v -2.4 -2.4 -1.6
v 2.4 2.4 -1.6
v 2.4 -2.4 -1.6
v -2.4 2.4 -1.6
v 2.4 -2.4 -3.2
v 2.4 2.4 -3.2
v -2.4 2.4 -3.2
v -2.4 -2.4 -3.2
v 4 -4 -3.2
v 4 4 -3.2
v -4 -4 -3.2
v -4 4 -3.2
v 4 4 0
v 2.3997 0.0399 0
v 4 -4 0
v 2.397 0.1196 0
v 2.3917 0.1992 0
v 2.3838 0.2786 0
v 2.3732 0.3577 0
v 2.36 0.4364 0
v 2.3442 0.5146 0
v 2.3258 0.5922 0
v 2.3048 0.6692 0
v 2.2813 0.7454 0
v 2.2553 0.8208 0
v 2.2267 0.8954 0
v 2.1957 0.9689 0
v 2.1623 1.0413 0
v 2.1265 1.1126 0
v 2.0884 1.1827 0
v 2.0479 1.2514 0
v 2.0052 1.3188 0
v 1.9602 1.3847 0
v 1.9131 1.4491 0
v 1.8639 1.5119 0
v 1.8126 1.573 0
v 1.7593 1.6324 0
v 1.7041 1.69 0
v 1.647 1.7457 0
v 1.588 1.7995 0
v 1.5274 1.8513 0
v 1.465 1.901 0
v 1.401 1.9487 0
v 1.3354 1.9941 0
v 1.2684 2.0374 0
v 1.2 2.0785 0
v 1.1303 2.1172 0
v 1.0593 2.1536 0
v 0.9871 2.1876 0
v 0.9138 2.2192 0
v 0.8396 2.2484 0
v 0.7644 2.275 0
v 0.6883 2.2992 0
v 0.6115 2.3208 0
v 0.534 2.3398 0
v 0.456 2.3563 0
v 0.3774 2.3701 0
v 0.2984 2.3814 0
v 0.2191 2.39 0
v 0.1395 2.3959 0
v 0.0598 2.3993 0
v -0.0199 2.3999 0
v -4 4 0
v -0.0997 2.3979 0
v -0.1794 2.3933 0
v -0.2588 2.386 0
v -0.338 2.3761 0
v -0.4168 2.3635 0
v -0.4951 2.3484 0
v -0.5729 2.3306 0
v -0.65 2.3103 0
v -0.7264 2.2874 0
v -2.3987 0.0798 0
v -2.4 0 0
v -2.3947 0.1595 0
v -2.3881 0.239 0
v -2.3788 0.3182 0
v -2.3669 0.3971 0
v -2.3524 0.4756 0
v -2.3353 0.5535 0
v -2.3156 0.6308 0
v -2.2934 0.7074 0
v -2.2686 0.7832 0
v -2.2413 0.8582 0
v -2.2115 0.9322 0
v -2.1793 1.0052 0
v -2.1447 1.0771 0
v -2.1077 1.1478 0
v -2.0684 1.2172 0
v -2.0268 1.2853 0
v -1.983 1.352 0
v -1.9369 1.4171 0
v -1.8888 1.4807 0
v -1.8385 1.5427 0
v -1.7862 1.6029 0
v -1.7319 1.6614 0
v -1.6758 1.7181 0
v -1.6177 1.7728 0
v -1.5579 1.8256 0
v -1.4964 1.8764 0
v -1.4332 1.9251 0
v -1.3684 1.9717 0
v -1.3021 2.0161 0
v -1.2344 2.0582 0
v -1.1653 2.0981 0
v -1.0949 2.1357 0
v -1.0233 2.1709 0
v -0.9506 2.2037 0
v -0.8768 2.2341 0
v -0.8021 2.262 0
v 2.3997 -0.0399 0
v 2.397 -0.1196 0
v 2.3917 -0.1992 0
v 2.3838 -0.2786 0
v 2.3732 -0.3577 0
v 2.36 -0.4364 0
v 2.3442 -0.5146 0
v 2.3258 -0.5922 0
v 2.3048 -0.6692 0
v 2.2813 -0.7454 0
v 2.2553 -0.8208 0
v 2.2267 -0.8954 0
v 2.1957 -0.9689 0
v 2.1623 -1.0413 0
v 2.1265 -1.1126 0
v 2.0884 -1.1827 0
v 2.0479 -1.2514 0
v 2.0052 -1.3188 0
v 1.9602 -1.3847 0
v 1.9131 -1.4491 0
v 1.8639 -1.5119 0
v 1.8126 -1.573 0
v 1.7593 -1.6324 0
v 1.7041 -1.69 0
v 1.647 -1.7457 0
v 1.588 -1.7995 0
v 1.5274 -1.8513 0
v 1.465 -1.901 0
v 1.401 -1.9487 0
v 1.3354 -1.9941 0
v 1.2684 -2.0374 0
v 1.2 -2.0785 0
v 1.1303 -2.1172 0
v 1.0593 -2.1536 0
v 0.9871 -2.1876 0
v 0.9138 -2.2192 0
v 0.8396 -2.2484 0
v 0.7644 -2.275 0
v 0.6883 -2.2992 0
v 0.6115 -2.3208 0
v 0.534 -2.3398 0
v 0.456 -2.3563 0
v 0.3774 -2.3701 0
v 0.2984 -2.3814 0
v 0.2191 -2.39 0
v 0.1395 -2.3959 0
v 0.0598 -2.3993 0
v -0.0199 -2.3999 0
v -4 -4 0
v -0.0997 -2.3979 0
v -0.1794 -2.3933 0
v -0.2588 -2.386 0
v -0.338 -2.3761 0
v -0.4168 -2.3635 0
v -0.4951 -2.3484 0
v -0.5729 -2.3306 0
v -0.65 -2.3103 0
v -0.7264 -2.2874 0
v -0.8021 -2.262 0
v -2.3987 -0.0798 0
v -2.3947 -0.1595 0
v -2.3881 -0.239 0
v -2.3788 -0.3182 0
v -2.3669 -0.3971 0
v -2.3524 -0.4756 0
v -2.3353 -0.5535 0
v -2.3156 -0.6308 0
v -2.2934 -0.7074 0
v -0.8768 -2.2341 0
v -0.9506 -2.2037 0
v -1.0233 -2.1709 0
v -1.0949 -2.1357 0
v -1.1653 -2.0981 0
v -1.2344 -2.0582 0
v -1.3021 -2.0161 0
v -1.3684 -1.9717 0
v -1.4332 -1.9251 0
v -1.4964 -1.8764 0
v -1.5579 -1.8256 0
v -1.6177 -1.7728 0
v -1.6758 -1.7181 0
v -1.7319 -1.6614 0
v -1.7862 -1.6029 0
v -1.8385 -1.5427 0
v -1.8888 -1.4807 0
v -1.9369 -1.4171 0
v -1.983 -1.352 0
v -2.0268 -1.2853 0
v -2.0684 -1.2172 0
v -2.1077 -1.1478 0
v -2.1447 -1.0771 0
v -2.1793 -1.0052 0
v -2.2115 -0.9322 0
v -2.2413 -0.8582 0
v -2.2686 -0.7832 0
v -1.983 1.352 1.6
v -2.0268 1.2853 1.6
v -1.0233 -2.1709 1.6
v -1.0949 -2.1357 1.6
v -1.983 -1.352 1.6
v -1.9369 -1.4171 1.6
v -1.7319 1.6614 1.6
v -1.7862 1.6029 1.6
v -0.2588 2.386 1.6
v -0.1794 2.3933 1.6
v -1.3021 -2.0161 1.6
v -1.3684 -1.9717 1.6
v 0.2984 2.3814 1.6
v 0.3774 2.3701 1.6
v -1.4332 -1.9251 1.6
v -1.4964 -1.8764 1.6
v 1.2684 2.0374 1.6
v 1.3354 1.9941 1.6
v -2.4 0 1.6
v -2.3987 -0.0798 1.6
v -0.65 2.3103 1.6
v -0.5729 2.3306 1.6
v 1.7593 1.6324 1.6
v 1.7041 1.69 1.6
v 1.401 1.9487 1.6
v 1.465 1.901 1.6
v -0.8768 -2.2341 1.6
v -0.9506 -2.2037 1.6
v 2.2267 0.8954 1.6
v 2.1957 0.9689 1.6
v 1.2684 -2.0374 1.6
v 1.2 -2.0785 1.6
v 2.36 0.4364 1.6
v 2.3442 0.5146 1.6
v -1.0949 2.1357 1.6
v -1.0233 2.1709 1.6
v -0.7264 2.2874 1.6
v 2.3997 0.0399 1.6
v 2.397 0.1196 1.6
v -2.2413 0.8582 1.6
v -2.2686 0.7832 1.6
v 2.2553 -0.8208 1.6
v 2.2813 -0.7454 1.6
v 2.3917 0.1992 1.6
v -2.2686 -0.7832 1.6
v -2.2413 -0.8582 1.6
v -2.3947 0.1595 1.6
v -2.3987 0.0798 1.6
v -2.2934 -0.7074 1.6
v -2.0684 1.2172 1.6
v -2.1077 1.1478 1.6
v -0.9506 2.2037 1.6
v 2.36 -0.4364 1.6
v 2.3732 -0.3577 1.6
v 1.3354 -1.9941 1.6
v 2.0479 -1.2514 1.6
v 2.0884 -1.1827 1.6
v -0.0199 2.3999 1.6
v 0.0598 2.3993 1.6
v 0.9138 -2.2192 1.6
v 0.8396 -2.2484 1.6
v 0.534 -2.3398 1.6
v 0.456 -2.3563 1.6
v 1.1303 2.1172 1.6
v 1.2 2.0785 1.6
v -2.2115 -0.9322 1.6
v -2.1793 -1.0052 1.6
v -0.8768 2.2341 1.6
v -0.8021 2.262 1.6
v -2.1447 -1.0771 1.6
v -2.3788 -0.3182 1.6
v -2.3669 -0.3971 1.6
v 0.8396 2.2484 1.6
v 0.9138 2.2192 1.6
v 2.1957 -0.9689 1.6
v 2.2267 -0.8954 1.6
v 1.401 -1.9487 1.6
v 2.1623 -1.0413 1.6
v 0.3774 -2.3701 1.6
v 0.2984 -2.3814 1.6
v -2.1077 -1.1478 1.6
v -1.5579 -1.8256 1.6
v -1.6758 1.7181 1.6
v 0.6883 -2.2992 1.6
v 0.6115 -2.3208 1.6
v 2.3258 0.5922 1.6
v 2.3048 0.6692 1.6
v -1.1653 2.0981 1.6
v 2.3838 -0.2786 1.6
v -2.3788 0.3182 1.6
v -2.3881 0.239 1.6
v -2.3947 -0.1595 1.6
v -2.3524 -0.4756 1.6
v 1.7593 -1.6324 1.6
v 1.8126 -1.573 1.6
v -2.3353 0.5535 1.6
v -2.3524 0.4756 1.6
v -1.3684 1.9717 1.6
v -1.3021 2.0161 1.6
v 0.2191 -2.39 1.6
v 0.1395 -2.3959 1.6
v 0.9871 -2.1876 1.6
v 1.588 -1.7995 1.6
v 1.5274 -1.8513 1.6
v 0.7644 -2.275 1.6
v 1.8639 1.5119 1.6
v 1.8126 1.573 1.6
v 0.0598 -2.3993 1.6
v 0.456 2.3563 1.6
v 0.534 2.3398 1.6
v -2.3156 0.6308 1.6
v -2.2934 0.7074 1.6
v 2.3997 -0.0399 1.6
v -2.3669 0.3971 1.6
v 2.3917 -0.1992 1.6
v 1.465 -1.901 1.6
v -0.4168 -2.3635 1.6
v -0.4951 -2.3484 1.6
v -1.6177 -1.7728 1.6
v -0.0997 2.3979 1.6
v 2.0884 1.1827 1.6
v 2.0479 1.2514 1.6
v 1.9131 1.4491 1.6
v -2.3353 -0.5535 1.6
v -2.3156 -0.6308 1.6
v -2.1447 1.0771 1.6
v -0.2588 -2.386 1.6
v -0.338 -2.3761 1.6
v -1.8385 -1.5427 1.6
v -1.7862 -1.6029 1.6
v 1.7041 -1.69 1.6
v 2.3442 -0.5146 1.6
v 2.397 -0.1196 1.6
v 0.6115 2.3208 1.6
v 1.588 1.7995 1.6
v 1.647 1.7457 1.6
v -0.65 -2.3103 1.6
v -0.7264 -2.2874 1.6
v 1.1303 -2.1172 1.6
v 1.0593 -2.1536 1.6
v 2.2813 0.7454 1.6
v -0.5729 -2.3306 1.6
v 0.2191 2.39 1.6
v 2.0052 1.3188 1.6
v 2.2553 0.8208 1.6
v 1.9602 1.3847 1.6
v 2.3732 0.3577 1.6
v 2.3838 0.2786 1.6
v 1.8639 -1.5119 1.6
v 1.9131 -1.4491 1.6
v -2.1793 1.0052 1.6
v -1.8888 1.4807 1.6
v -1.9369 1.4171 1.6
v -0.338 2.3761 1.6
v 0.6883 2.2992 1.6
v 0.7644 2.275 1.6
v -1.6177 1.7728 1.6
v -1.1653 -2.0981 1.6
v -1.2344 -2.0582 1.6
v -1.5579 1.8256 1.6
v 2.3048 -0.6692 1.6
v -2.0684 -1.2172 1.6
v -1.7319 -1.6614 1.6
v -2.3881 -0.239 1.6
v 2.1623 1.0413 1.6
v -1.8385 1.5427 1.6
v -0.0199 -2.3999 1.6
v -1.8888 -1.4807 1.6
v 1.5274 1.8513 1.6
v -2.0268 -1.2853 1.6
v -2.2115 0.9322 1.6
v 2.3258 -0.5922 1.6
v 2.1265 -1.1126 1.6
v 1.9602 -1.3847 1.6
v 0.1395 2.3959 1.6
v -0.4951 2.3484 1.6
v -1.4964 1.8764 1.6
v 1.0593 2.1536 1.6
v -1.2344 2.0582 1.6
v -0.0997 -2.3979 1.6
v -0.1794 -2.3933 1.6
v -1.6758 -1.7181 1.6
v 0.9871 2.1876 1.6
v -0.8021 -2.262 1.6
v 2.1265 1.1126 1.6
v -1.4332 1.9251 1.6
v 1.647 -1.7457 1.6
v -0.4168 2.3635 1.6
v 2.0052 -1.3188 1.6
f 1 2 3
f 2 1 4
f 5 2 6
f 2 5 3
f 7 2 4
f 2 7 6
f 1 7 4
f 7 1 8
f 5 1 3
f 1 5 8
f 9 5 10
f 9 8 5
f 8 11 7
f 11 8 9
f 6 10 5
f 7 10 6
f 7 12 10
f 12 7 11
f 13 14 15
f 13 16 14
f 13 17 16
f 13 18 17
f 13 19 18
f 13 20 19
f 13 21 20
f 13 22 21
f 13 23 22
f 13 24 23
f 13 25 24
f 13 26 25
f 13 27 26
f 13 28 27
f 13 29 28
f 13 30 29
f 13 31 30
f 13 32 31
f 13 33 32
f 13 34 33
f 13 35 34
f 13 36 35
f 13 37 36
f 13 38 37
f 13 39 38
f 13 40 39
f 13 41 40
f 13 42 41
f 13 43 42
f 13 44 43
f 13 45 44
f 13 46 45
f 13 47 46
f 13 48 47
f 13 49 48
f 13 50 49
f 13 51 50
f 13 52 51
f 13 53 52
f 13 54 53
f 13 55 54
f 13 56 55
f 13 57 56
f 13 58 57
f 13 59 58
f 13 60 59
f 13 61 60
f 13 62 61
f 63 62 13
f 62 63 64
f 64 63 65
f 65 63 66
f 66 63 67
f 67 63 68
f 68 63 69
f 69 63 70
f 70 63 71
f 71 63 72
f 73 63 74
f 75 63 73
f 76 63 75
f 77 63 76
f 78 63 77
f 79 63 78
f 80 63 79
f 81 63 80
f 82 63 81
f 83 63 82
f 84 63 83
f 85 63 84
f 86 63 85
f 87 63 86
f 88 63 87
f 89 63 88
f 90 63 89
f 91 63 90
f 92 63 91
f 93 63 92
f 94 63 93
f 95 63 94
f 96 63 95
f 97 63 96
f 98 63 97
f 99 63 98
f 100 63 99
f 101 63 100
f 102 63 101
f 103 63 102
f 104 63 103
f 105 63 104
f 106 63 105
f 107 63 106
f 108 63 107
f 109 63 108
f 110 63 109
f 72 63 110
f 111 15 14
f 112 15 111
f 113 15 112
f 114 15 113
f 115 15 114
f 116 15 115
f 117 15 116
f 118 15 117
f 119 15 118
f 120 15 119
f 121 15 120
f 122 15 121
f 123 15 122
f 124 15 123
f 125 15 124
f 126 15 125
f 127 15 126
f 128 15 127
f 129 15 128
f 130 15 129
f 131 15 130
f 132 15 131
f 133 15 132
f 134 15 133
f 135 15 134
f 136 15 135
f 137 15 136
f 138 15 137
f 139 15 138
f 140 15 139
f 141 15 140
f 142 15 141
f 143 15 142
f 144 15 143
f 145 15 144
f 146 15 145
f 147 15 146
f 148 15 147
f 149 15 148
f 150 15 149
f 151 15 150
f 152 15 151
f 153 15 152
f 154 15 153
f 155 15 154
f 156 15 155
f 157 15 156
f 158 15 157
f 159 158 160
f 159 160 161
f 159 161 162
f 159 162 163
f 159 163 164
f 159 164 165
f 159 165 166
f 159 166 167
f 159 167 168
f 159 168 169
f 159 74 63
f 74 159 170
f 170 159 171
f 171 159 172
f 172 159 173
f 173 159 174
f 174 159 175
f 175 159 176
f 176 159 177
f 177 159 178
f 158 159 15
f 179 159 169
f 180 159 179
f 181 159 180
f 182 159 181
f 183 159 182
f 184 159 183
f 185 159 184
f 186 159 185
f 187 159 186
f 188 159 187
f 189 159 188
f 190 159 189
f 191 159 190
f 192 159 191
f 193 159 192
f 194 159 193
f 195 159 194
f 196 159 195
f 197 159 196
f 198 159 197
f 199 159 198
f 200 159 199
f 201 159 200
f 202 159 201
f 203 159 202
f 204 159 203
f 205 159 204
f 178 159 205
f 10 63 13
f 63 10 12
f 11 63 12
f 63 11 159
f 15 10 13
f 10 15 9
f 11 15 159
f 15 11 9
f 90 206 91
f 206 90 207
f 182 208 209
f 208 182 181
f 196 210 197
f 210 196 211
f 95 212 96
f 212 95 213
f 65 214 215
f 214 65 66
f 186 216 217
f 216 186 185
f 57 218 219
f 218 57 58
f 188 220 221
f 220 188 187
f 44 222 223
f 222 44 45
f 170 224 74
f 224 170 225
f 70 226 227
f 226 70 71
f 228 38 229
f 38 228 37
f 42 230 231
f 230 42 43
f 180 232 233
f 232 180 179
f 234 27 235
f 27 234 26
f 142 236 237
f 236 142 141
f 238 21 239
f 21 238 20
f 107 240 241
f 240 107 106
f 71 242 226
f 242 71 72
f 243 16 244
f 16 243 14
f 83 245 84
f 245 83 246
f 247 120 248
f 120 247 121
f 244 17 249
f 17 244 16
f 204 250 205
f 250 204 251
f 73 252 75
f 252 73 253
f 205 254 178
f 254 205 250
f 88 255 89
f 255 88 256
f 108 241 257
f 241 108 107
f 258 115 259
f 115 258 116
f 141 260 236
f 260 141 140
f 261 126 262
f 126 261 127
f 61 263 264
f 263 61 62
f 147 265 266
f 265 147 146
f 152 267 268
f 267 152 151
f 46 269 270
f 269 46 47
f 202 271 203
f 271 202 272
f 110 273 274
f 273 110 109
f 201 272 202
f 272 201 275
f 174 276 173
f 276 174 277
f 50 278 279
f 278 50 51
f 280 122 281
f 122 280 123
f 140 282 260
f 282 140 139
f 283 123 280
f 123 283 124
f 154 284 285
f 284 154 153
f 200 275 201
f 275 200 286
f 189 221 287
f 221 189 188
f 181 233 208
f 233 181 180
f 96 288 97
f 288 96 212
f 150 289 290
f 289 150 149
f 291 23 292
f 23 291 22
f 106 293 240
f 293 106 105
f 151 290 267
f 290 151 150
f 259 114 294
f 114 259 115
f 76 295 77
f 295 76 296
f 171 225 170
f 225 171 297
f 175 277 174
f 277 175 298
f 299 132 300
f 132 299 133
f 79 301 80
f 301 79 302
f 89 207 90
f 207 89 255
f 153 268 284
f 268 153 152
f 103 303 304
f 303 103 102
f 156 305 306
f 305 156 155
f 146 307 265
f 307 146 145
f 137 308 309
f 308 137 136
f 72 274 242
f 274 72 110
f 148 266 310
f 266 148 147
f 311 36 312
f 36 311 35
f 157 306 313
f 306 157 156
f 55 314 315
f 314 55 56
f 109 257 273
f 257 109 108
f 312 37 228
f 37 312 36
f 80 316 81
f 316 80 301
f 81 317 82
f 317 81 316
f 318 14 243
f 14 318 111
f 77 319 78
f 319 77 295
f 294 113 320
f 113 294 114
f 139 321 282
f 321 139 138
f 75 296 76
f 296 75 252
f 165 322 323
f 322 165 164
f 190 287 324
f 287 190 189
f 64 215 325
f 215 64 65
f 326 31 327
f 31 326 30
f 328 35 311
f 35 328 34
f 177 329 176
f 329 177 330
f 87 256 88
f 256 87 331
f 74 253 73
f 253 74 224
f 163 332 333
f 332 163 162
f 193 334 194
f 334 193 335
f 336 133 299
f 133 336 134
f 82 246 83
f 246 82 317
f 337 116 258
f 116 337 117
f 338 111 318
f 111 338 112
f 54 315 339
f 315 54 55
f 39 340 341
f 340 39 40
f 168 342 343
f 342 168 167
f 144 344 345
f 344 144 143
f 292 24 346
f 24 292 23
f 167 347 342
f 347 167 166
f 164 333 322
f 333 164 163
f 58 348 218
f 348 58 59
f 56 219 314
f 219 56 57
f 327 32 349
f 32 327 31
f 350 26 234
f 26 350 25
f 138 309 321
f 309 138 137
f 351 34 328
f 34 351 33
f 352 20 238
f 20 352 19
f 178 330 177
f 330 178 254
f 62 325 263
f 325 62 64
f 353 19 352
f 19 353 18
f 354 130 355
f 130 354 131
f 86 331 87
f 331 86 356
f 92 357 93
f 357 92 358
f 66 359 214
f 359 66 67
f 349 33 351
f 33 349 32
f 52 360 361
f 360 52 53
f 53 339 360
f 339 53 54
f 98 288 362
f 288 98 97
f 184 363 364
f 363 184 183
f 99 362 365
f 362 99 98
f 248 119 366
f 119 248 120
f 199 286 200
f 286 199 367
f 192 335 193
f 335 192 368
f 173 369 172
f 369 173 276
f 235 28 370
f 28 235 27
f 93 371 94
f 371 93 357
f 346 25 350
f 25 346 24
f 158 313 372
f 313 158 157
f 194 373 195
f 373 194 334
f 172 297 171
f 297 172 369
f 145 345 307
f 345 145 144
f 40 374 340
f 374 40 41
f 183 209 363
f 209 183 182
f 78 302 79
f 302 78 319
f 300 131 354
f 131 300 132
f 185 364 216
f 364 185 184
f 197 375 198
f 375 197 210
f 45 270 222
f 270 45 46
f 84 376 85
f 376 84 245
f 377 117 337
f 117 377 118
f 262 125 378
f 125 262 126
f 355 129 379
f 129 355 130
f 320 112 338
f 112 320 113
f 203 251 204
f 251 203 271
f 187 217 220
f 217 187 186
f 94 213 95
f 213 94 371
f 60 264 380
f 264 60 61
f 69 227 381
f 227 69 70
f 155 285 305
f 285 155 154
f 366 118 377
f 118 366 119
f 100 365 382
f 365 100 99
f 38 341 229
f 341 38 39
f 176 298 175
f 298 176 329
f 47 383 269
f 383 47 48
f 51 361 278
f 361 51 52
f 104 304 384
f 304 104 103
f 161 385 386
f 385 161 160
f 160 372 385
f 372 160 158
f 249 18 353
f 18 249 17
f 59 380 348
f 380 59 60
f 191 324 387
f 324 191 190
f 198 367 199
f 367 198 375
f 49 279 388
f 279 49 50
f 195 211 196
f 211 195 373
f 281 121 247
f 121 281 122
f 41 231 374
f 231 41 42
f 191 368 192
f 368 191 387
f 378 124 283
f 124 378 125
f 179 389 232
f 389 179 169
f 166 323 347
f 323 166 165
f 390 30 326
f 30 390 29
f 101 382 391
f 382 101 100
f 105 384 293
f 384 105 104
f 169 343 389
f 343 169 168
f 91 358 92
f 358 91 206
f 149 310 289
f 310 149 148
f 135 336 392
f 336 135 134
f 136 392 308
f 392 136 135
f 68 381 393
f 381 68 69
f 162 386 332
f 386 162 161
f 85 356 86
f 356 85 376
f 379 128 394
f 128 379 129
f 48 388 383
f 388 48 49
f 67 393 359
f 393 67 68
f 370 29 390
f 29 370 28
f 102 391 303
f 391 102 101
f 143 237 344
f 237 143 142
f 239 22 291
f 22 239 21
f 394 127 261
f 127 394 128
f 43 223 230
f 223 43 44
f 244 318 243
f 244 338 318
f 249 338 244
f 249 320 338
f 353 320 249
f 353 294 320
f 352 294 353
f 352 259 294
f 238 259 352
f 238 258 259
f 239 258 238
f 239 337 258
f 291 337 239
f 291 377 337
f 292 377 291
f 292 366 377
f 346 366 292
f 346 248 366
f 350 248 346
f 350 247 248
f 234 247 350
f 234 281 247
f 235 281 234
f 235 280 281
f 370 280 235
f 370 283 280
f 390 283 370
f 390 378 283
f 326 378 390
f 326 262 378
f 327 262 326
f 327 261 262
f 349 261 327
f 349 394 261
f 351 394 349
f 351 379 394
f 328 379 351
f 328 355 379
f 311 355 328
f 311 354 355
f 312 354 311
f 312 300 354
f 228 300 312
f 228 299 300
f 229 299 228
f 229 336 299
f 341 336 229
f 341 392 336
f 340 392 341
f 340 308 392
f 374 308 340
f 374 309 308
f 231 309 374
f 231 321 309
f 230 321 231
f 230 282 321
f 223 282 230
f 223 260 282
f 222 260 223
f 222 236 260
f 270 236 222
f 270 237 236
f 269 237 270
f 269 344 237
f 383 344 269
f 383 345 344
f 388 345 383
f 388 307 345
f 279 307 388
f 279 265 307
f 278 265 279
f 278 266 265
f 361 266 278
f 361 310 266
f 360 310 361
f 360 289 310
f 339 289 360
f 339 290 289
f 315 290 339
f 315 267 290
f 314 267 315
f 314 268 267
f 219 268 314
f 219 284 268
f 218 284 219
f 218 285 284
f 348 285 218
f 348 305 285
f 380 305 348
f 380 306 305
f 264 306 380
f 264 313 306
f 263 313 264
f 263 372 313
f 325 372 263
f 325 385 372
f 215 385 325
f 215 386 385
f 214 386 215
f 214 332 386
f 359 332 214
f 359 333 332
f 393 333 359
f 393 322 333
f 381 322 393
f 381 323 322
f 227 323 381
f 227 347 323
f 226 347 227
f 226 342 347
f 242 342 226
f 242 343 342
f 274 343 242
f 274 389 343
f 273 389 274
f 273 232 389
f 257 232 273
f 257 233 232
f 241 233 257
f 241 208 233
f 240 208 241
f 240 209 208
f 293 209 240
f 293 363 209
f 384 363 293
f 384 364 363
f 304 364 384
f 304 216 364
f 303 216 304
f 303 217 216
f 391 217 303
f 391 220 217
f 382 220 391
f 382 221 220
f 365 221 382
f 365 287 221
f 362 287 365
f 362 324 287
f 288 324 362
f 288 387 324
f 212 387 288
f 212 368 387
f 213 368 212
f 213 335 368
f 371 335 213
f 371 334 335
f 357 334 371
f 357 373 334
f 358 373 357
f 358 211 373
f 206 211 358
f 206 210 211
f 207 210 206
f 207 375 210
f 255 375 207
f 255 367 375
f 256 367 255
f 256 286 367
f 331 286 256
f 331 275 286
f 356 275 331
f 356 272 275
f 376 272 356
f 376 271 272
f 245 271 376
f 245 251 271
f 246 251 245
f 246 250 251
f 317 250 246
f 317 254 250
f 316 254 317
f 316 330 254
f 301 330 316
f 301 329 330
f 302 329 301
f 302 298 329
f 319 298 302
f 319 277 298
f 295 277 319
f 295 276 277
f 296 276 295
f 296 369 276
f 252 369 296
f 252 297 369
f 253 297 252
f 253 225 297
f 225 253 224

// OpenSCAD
// file: ../p/stud3.scad
use <../lib.scad>
use <4-4cyli.scad>
use <4-4disc.scad>
use <4-4edge.scad>
$fa=1; $fs=0.2;
function ldraw_lib__stud3(realsolid=false) = realsolid ? 
    [openscad(translate([0,0,-eps()], o=cylinder(4+eps(), r=4)),2)] : [
// 0 Stud Tube Solid
// 0 Name: stud3.dat
// 0 Author: James Jessiman
// 0 !LDRAW_ORG Primitive UPDATE 2012-01
// 0 !LICENSE Licensed under CC BY 2.0 and CC BY 4.0 : see CAreadme.txt
// 
// 0 BFC CERTIFY CCW
  [0,"BFC","CERTIFY"],
  [0,"BFC","CCW"],
// 
// 0 !HISTORY 2002-04-04 [sbliss] Modified for BFC compliance
// 0 !HISTORY 2002-04-25 [PTadmin] Official Update 2002-02
// 0 !HISTORY 2007-06-24 [PTadmin] Header formatted for Contributor Agreement
// 0 !HISTORY 2008-07-01 [PTadmin] Official Update 2008-01
// 0 !HISTORY 2012-02-16 [Philo] Changed to CCW
// 0 !HISTORY 2012-03-30 [PTadmin] Official Update 2012-01
// 
// 
// 1 16 0 -4 0 4 0 0 0 1 0 0 0 4 4-4edge.dat
  [1,16,0,-4,0,4,0,0,0,1,0,0,0,4, ldraw_lib__4_4edge(realsolid)],
// 1 16 0 0 0 4 0 0 0 1 0 0 0 4 4-4edge.dat
  [1,16,0,0,0,4,0,0,0,1,0,0,0,4, ldraw_lib__4_4edge(realsolid)],
// 1 16 0 -4 0 4 0 0 0 1 0 0 0 4 4-4disc.dat
  [1,16,0,-4,0,4,0,0,0,1,0,0,0,4, ldraw_lib__4_4disc(realsolid)],
// 1 16 0 -4 0 4 0 0 0 4 0 0 0 4 4-4cyli.dat
  [1,16,0,-4,0,4,0,0,0,4,0,0,0,4, ldraw_lib__4_4cyli(realsolid)],
];
module ldraw_lib__stud3(step=0, col=false, unit=2/5, alt=false, line=0.2, solid=!$preview)
    makepoly(ldraw_lib__stud3(solid), step=step, col=col, unit=unit, alt=alt, line=line, solid=solid);
ldraw_lib__stud3(line=0.2);
// file: ../p/4-4edge.scad
use <../lib.scad>
$fa=1; $fs=0.2;
function ldraw_lib__4_4edge(realsolid=false) = [
// 0 Circle 1.0
// 0 Name: 4-4edge.dat
// 0 Author: James Jessiman
// 0 !LDRAW_ORG Primitive UPDATE 2017-01
// 0 !LICENSE Licensed under CC BY 2.0 and CC BY 4.0 : see CAreadme.txt
// 
// 0 BFC CERTIFY CCW
  [0,"BFC","CERTIFY"],
  [0,"BFC","CCW"],
// 
// 0 !HISTORY 1998-12-15 [PTadmin] Official Update 1998-10
// 0 !HISTORY 2005-12-28 [PTadmin] Official Update 2005-01
// 0 !HISTORY 2007-06-24 [PTadmin] Header formatted for Contributor Agreement
// 0 !HISTORY 2008-07-01 [PTadmin] Official Update 2008-01
// 0 !HISTORY 2017-01-15 [Steffen] BFCed
// 0 !HISTORY 2017-12-30 [PTadmin] Official Update 2017-01
// 
// 
// 2 24 1 0 0 0.9239 0 0.3827
  [2,24,1,0,0,0.9239,0,0.3827],
// 2 24 0.9239 0 0.3827 0.7071 0 0.7071
  [2,24,0.9239,0,0.3827,0.7071,0,0.7071],
// 2 24 0.7071 0 0.7071 0.3827 0 0.9239
  [2,24,0.7071,0,0.7071,0.3827,0,0.9239],
// 2 24 0.3827 0 0.9239 0 0 1
  [2,24,0.3827,0,0.9239,0,0,1],
// 2 24 0 0 1 -0.3827 0 0.9239
  [2,24,0,0,1,-0.3827,0,0.9239],
// 2 24 -0.3827 0 0.9239 -0.7071 0 0.7071
  [2,24,-0.3827,0,0.9239,-0.7071,0,0.7071],
// 2 24 -0.7071 0 0.7071 -0.9239 0 0.3827
  [2,24,-0.7071,0,0.7071,-0.9239,0,0.3827],
// 2 24 -0.9239 0 0.3827 -1 0 -0
  [2,24,-0.9239,0,0.3827,-1,0,-0],
// 2 24 -1 0 -0 -0.9239 0 -0.3827
  [2,24,-1,0,-0,-0.9239,0,-0.3827],
// 2 24 -0.9239 0 -0.3827 -0.7071 0 -0.7071
  [2,24,-0.9239,0,-0.3827,-0.7071,0,-0.7071],
// 2 24 -0.7071 0 -0.7071 -0.3827 0 -0.9239
  [2,24,-0.7071,0,-0.7071,-0.3827,0,-0.9239],
// 2 24 -0.3827 0 -0.9239 0 0 -1
  [2,24,-0.3827,0,-0.9239,0,0,-1],
// 2 24 0 0 -1 0.3827 0 -0.9239
  [2,24,0,0,-1,0.3827,0,-0.9239],
// 2 24 0.3827 0 -0.9239 0.7071 0 -0.7071
  [2,24,0.3827,0,-0.9239,0.7071,0,-0.7071],
// 2 24 0.7071 0 -0.7071 0.9239 0 -0.3827
  [2,24,0.7071,0,-0.7071,0.9239,0,-0.3827],
// 2 24 0.9239 0 -0.3827 1 0 0
  [2,24,0.9239,0,-0.3827,1,0,0],
];
module ldraw_lib__4_4edge(step=0, col=false, unit=2/5, alt=false, line=0.2, solid=!$preview)
    makepoly(ldraw_lib__4_4edge(solid), step=step, col=col, unit=unit, alt=alt, line=line, solid=solid);
ldraw_lib__4_4edge(line=0.2);
// file: ../p/4-4disc.scad
use <../lib.scad>
$fa=1; $fs=0.2;
function ldraw_lib__4_4disc(realsolid=false) = [
// 0 Disc 1.0
// 0 Name: 4-4disc.dat
// 0 Author: James Jessiman
// 0 !LDRAW_ORG Primitive UPDATE 2002-02
// 0 !LICENSE Licensed under CC BY 2.0 and CC BY 4.0 : see CAreadme.txt
// 
// 0 BFC CERTIFY CCW
  [0,"BFC","CERTIFY"],
  [0,"BFC","CCW"],
// 
// 0 !HISTORY 1998-12-15 [PTadmin] Official Update 1998-10
// 0 !HISTORY 2002-03-23 [sbliss] Added BFC statement
// 0 !HISTORY 2002-04-25 [PTadmin] Official Update 2002-02
// 0 !HISTORY 2007-06-24 [PTadmin] Header formatted for Contributor Agreement
// 0 !HISTORY 2008-07-01 [PTadmin] Official Update 2008-01
// 
// 
// 3 16 0 0 0 1 0 0 0.9239 0 0.3827
  [3,16,0,0,0,1,0,0,0.9239,0,0.3827],
// 3 16 0 0 0 0.9239 0 0.3827 0.7071 0 0.7071
  [3,16,0,0,0,0.9239,0,0.3827,0.7071,0,0.7071],
// 3 16 0 0 0 0.7071 0 0.7071 0.3827 0 0.9239
  [3,16,0,0,0,0.7071,0,0.7071,0.3827,0,0.9239],
// 3 16 0 0 0 0.3827 0 0.9239 0 0 1
  [3,16,0,0,0,0.3827,0,0.9239,0,0,1],
// 3 16 0 0 0 0 0 1 -0.3827 0 0.9239
  [3,16,0,0,0,0,0,1,-0.3827,0,0.9239],
// 3 16 0 0 0 -0.3827 0 0.9239 -0.7071 0 0.7071
  [3,16,0,0,0,-0.3827,0,0.9239,-0.7071,0,0.7071],
// 3 16 0 0 0 -0.7071 0 0.7071 -0.9239 0 0.3827
  [3,16,0,0,0,-0.7071,0,0.7071,-0.9239,0,0.3827],
// 3 16 0 0 0 -0.9239 0 0.3827 -1 0 -0
  [3,16,0,0,0,-0.9239,0,0.3827,-1,0,-0],
// 3 16 0 0 0 -1 0 -0 -0.9239 0 -0.3827
  [3,16,0,0,0,-1,0,-0,-0.9239,0,-0.3827],
// 3 16 0 0 0 -0.9239 0 -0.3827 -0.7071 0 -0.7071
  [3,16,0,0,0,-0.9239,0,-0.3827,-0.7071,0,-0.7071],
// 3 16 0 0 0 -0.7071 0 -0.7071 -0.3827 0 -0.9239
  [3,16,0,0,0,-0.7071,0,-0.7071,-0.3827,0,-0.9239],
// 3 16 0 0 0 -0.3827 0 -0.9239 0 0 -1
  [3,16,0,0,0,-0.3827,0,-0.9239,0,0,-1],
// 3 16 0 0 0 0 0 -1 0.3827 0 -0.9239
  [3,16,0,0,0,0,0,-1,0.3827,0,-0.9239],
// 3 16 0 0 0 0.3827 0 -0.9239 0.7071 0 -0.7071
  [3,16,0,0,0,0.3827,0,-0.9239,0.7071,0,-0.7071],
// 3 16 0 0 0 0.7071 0 -0.7071 0.9239 0 -0.3827
  [3,16,0,0,0,0.7071,0,-0.7071,0.9239,0,-0.3827],
// 3 16 0 0 0 0.9239 0 -0.3827 1 0 0
  [3,16,0,0,0,0.9239,0,-0.3827,1,0,0],
// 0
];
module ldraw_lib__4_4disc(step=0, col=false, unit=2/5, alt=false, line=0.2, solid=!$preview)
    makepoly(ldraw_lib__4_4disc(solid), step=step, col=col, unit=unit, alt=alt, line=line, solid=solid);
ldraw_lib__4_4disc(line=0.2);
// file: ../p/4-4cyli.scad
use <../lib.scad>
$fa=1; $fs=0.2;
function ldraw_lib__4_4cyli(realsolid=false) = [
// 0 Cylinder 1.0
// 0 Name: 4-4cyli.dat
// 0 Author: James Jessiman
// 0 !LDRAW_ORG Primitive UPDATE 2005-01
// 0 !LICENSE Licensed under CC BY 2.0 and CC BY 4.0 : see CAreadme.txt
// 
// 0 BFC CERTIFY CCW
  [0,"BFC","CERTIFY"],
  [0,"BFC","CCW"],
// 
// 0 !HISTORY 1998-12-15 [PTadmin] Official Update 1998-10
// 0 !HISTORY 2002-03-23 [sbliss] Added BFC statement; merged headers from files in distributions LDraw 0.27 and Complete.
// 0 !HISTORY 2002-04-25 [PTadmin] Official Update 2002-02
// 0 !HISTORY 2004-12-14 [guyvivan] BFC CCW
// 0 !HISTORY 2005-12-28 [PTadmin] Official Update 2005-01
// 0 !HISTORY 2007-06-24 [PTadmin] Header formatted for Contributor Agreement
// 0 !HISTORY 2008-07-01 [PTadmin] Official Update 2008-01
// 
// 
// 4 16 1 1 0 0.9239 1 0.3827 0.9239 0 0.3827 1 0 0
  [4,16,1,1,0,0.9239,1,0.3827,0.9239,0,0.3827,1,0,0],
// 5 24 1 0 0 1 1 0 0.9239 0 0.3827 0.9239 0 -0.3827
  [5,24,1,0,0,1,1,0,0.9239,0,0.3827,0.9239,0,-0.3827],
// 4 16 0.9239 1 0.3827 0.7071 1 0.7071 0.7071 0 0.7071 0.9239 0 0.3827
  [4,16,0.9239,1,0.3827,0.7071,1,0.7071,0.7071,0,0.7071,0.9239,0,0.3827],
// 5 24 0.9239 0 0.3827 0.9239 1 0.3827 0.7071 0 0.7071 1 0 0
  [5,24,0.9239,0,0.3827,0.9239,1,0.3827,0.7071,0,0.7071,1,0,0],
// 4 16 0.7071 1 0.7071 0.3827 1 0.9239 0.3827 0 0.9239 0.7071 0 0.7071
  [4,16,0.7071,1,0.7071,0.3827,1,0.9239,0.3827,0,0.9239,0.7071,0,0.7071],
// 5 24 0.7071 0 0.7071 0.7071 1 0.7071 0.3827 0 0.9239 0.9239 0 0.3827
  [5,24,0.7071,0,0.7071,0.7071,1,0.7071,0.3827,0,0.9239,0.9239,0,0.3827],
// 4 16 0.3827 1 0.9239 0 1 1 0 0 1 0.3827 0 0.9239
  [4,16,0.3827,1,0.9239,0,1,1,0,0,1,0.3827,0,0.9239],
// 5 24 0.3827 0 0.9239 0.3827 1 0.9239 0 0 1 0.7071 0 0.7071
  [5,24,0.3827,0,0.9239,0.3827,1,0.9239,0,0,1,0.7071,0,0.7071],
// 4 16 0 1 1 -0.3827 1 0.9239 -0.3827 0 0.9239 0 0 1
  [4,16,0,1,1,-0.3827,1,0.9239,-0.3827,0,0.9239,0,0,1],
// 5 24 0 0 1 0 1 1 -0.3827 0 0.9239 0.3827 0 0.9239
  [5,24,0,0,1,0,1,1,-0.3827,0,0.9239,0.3827,0,0.9239],
// 4 16 -0.3827 1 0.9239 -0.7071 1 0.7071 -0.7071 0 0.7071 -0.3827 0 0.9239
  [4,16,-0.3827,1,0.9239,-0.7071,1,0.7071,-0.7071,0,0.7071,-0.3827,0,0.9239],
// 5 24 -0.3827 0 0.9239 -0.3827 1 0.9239 -0.7071 0 0.7071 0 0 1
  [5,24,-0.3827,0,0.9239,-0.3827,1,0.9239,-0.7071,0,0.7071,0,0,1],
// 4 16 -0.7071 1 0.7071 -0.9239 1 0.3827 -0.9239 0 0.3827 -0.7071 0 0.7071
  [4,16,-0.7071,1,0.7071,-0.9239,1,0.3827,-0.9239,0,0.3827,-0.7071,0,0.7071],
// 5 24 -0.7071 0 0.7071 -0.7071 1 0.7071 -0.9239 0 0.3827 -0.3827 0 0.9239
  [5,24,-0.7071,0,0.7071,-0.7071,1,0.7071,-0.9239,0,0.3827,-0.3827,0,0.9239],
// 4 16 -0.9239 1 0.3827 -1 1 0 -1 0 0 -0.9239 0 0.3827
  [4,16,-0.9239,1,0.3827,-1,1,0,-1,0,0,-0.9239,0,0.3827],
// 5 24 -0.9239 0 0.3827 -0.9239 1 0.3827 -1 0 0 -0.7071 0 0.7071
  [5,24,-0.9239,0,0.3827,-0.9239,1,0.3827,-1,0,0,-0.7071,0,0.7071],
// 4 16 -1 1 0 -0.9239 1 -0.3827 -0.9239 0 -0.3827 -1 0 0
  [4,16,-1,1,0,-0.9239,1,-0.3827,-0.9239,0,-0.3827,-1,0,0],
// 5 24 -1 0 0 -1 1 0 -0.9239 0 -0.3827 -0.9239 0 0.3827
  [5,24,-1,0,0,-1,1,0,-0.9239,0,-0.3827,-0.9239,0,0.3827],
// 4 16 -0.9239 1 -0.3827 -0.7071 1 -0.7071 -0.7071 0 -0.7071 -0.9239 0 -0.3827
  [4,16,-0.9239,1,-0.3827,-0.7071,1,-0.7071,-0.7071,0,-0.7071,-0.9239,0,-0.3827],
// 5 24 -0.9239 0 -0.3827 -0.9239 1 -0.3827 -0.7071 0 -0.7071 -1 0 0
  [5,24,-0.9239,0,-0.3827,-0.9239,1,-0.3827,-0.7071,0,-0.7071,-1,0,0],
// 4 16 -0.7071 1 -0.7071 -0.3827 1 -0.9239 -0.3827 0 -0.9239 -0.7071 0 -0.7071
  [4,16,-0.7071,1,-0.7071,-0.3827,1,-0.9239,-0.3827,0,-0.9239,-0.7071,0,-0.7071],
// 5 24 -0.7071 0 -0.7071 -0.7071 1 -0.7071 -0.3827 0 -0.9239 -0.9239 0 -0.3827
  [5,24,-0.7071,0,-0.7071,-0.7071,1,-0.7071,-0.3827,0,-0.9239,-0.9239,0,-0.3827],
// 4 16 -0.3827 1 -0.9239 0 1 -1 0 0 -1 -0.3827 0 -0.9239
  [4,16,-0.3827,1,-0.9239,0,1,-1,0,0,-1,-0.3827,0,-0.9239],
// 5 24 -0.3827 0 -0.9239 -0.3827 1 -0.9239 0 0 -1 -0.7071 0 -0.7071
  [5,24,-0.3827,0,-0.9239,-0.3827,1,-0.9239,0,0,-1,-0.7071,0,-0.7071],
// 4 16 0 1 -1 0.3827 1 -0.9239 0.3827 0 -0.9239 0 0 -1
  [4,16,0,1,-1,0.3827,1,-0.9239,0.3827,0,-0.9239,0,0,-1],
// 5 24 0 0 -1 0 1 -1 0.3827 0 -0.9239 -0.3827 0 -0.9239
  [5,24,0,0,-1,0,1,-1,0.3827,0,-0.9239,-0.3827,0,-0.9239],
// 4 16 0.3827 1 -0.9239 0.7071 1 -0.7071 0.7071 0 -0.7071 0.3827 0 -0.9239
  [4,16,0.3827,1,-0.9239,0.7071,1,-0.7071,0.7071,0,-0.7071,0.3827,0,-0.9239],
// 5 24 0.3827 0 -0.9239 0.3827 1 -0.9239 0.7071 0 -0.7071 0 0 -1
  [5,24,0.3827,0,-0.9239,0.3827,1,-0.9239,0.7071,0,-0.7071,0,0,-1],
// 4 16 0.7071 1 -0.7071 0.9239 1 -0.3827 0.9239 0 -0.3827 0.7071 0 -0.7071
  [4,16,0.7071,1,-0.7071,0.9239,1,-0.3827,0.9239,0,-0.3827,0.7071,0,-0.7071],
// 5 24 0.7071 0 -0.7071 0.7071 1 -0.7071 0.9239 0 -0.3827 0.3827 0 -0.9239
  [5,24,0.7071,0,-0.7071,0.7071,1,-0.7071,0.9239,0,-0.3827,0.3827,0,-0.9239],
// 4 16 0.9239 1 -0.3827 1 1 0 1 0 0 0.9239 0 -0.3827
  [4,16,0.9239,1,-0.3827,1,1,0,1,0,0,0.9239,0,-0.3827],
// 5 24 0.9239 0 -0.3827 0.9239 1 -0.3827 1 0 0 0.7071 0 -0.7071
  [5,24,0.9239,0,-0.3827,0.9239,1,-0.3827,1,0,0,0.7071,0,-0.7071],
// 0
];
module ldraw_lib__4_4cyli(step=0, col=false, unit=2/5, alt=false, line=0.2, solid=!$preview)
    makepoly(ldraw_lib__4_4cyli(solid), step=step, col=col, unit=unit, alt=alt, line=line, solid=solid);
ldraw_lib__4_4cyli(line=0.2);
// file: s/3004s01.scad
use <../../lib.scad>
use <../../p/box4t.scad>
use <../../p/box5.scad>
use <../../p/stud.scad>
use <../../p/stud3.scad>
$fa=1; $fs=0.2;
function ldraw_lib__s__3004s01(realsolid=false) = [
// 0 ~Brick  1 x  2 without Front Face
// 0 Name: s\3004s01.dat
// 0 Author: James Jessiman
// 0 !LDRAW_ORG Subpart UPDATE 2003-03
// 0 !LICENSE Licensed under CC BY 2.0 and CC BY 4.0 : see CAreadme.txt
// 
// 0 BFC CERTIFY CCW
  [0,"BFC","CERTIFY"],
  [0,"BFC","CCW"],
// 
// 0 !HISTORY 2003-09-07 [jriley] Subfiling, BFC
// 0 !HISTORY 2003-12-19 [PTadmin] Official Update 2003-03
// 0 !HISTORY 2007-08-29 [PTadmin] Header formatted for Contributor Agreement
// 0 !HISTORY 2008-07-01 [PTadmin] Official Update 2008-01
// 
// 
// 1 16 0 4 0 1 0 0 0 -5 0 0 0 1 stud3.dat
  [1,16,0,4,0,1,0,0,0,-5,0,0,0,1, ldraw_lib__stud3(realsolid)],
// 0 BFC INVERTNEXT
  [0,"BFC","INVERTNEXT"],
// 1 16 0 24 0 16 0 0 0 -20 0 0 0 6 box5.dat
  [1,16,0,24,0,16,0,0,0,-20,0,0,0,6, ldraw_lib__box5(realsolid)],
// 4 16 20 24 10 16 24 6 -16 24 6 -20 24 10
  [4,16,20,24,10,16,24,6,-16,24,6,-20,24,10],
// 4 16 -20 24 10 -16 24 6 -16 24 -6 -20 24 -10
  [4,16,-20,24,10,-16,24,6,-16,24,-6,-20,24,-10],
// 4 16 -20 24 -10 -16 24 -6 16 24 -6 20 24 -10
  [4,16,-20,24,-10,-16,24,-6,16,24,-6,20,24,-10],
// 4 16 20 24 -10 16 24 -6 16 24 6 20 24 10
  [4,16,20,24,-10,16,24,-6,16,24,6,20,24,10],
// 1 16 0 24 0 20 0 0 0 -24 0 0 0 10 box4t.dat
  [1,16,0,24,0,20,0,0,0,-24,0,0,0,10, ldraw_lib__box4t(realsolid)],
// 1 16 10 0 0 1 0 0 0 1 0 0 0 1 stud.dat
  [1,16,10,0,0,1,0,0,0,1,0,0,0,1, ldraw_lib__stud(realsolid)],
// 1 16 -10 0 0 1 0 0 0 1 0 0 0 1 stud.dat
  [1,16,-10,0,0,1,0,0,0,1,0,0,0,1, ldraw_lib__stud(realsolid)],
// 0
];
module ldraw_lib__s__3004s01(step=0, col=false, unit=2/5, alt=false, line=0.2, solid=!$preview)
    makepoly(ldraw_lib__s__3004s01(solid), step=step, col=col, unit=unit, alt=alt, line=line, solid=solid);
ldraw_lib__s__3004s01(line=0.2);
// file: ../p/stud.scad
use <../lib.scad>
use <4-4cyli.scad>
use <4-4disc.scad>
use <4-4edge.scad>
$fa=1; $fs=0.2;
function ldraw_lib__stud(realsolid=false) = realsolid ? 
    [openscad(translate([0,0,-eps()], o=cylinder(4+eps(), r=6)),2)] : [
// 0 Stud
// 0 Name: stud.dat
// 0 Author: James Jessiman
// 0 !LDRAW_ORG Primitive UPDATE 2012-01
// 0 !LICENSE Licensed under CC BY 2.0 and CC BY 4.0 : see CAreadme.txt
// 
// 0 BFC CERTIFY CCW
  [0,"BFC","CERTIFY"],
  [0,"BFC","CCW"],
// 
// 0 !HISTORY 2002-04-04 [sbliss] Modified for BFC compliance
// 0 !HISTORY 2002-04-25 [PTadmin] Official Update 2002-02
// 0 !HISTORY 2007-06-24 [PTadmin] Header formatted for Contributor Agreement
// 0 !HISTORY 2008-07-01 [PTadmin] Official Update 2008-01
// 0 !HISTORY 2012-02-16 [Philo] Changed to CCW
// 0 !HISTORY 2012-03-30 [PTadmin] Official Update 2012-01
// 
// 
// 1 16 0 0 0 6 0 0 0 1 0 0 0 6 4-4edge.dat
  [1,16,0,0,0,6,0,0,0,1,0,0,0,6, ldraw_lib__4_4edge(realsolid)],
// 1 16 0 -4 0 6 0 0 0 1 0 0 0 6 4-4edge.dat
  [1,16,0,-4,0,6,0,0,0,1,0,0,0,6, ldraw_lib__4_4edge(realsolid)],
// 1 16 0 0 0 6 0 0 0 -4 0 0 0 6 4-4cyli.dat
  [1,16,0,0,0,6,0,0,0,-4,0,0,0,6, ldraw_lib__4_4cyli(realsolid)],
// 1 16 0 -4 0 6 0 0 0 1 0 0 0 6 4-4disc.dat
  [1,16,0,-4,0,6,0,0,0,1,0,0,0,6, ldraw_lib__4_4disc(realsolid)],
];
module ldraw_lib__stud(step=0, col=false, unit=2/5, alt=false, line=0.2, solid=!$preview)
    makepoly(ldraw_lib__stud(solid), step=step, col=col, unit=unit, alt=alt, line=line, solid=solid);
ldraw_lib__stud(line=0.2);
// file: ../p/box5.scad
use <../lib.scad>
$fa=1; $fs=0.2;
function ldraw_lib__box5(realsolid=false) = [
// 0 Box with 5 Faces and All Edges
// 0 Name: box5.dat
// 0 Author: James Jessiman
// 0 !LDRAW_ORG Primitive UPDATE 2012-01
// 0 !LICENSE Licensed under CC BY 2.0 and CC BY 4.0 : see CAreadme.txt
// 
// 0 BFC CERTIFY CCW
  [0,"BFC","CERTIFY"],
  [0,"BFC","CCW"],
// 
// 0 !HISTORY 2002-04-03 [sbliss] Modified for BFC compliance
// 0 !HISTORY 2002-04-25 [PTadmin] Official Update 2002-02
// 0 !HISTORY 2007-06-24 [PTadmin] Header formatted for Contributor Agreement
// 0 !HISTORY 2008-07-01 [PTadmin] Official Update 2008-01
// 0 !HISTORY 2012-02-16 [Philo] Changed to CCW
// 0 !HISTORY 2012-03-30 [PTadmin] Official Update 2012-01
// 
// 
// 2 24 1 1 1 -1 1 1
  [2,24,1,1,1,-1,1,1],
// 2 24 -1 1 1 -1 1 -1
  [2,24,-1,1,1,-1,1,-1],
// 2 24 -1 1 -1 1 1 -1
  [2,24,-1,1,-1,1,1,-1],
// 2 24 1 1 -1 1 1 1
  [2,24,1,1,-1,1,1,1],
// 2 24 1 0 1 -1 0 1
  [2,24,1,0,1,-1,0,1],
// 2 24 -1 0 1 -1 0 -1
  [2,24,-1,0,1,-1,0,-1],
// 2 24 -1 0 -1 1 0 -1
  [2,24,-1,0,-1,1,0,-1],
// 2 24 1 0 -1 1 0 1
  [2,24,1,0,-1,1,0,1],
// 2 24 1 0 1 1 1 1
  [2,24,1,0,1,1,1,1],
// 2 24 -1 0 1 -1 1 1
  [2,24,-1,0,1,-1,1,1],
// 2 24 1 0 -1 1 1 -1
  [2,24,1,0,-1,1,1,-1],
// 2 24 -1 0 -1 -1 1 -1
  [2,24,-1,0,-1,-1,1,-1],
// 4 16 -1 1 1 1 1 1 1 1 -1 -1 1 -1
  [4,16,-1,1,1,1,1,1,1,1,-1,-1,1,-1],
// 4 16 -1 1 1 -1 0 1 1 0 1 1 1 1
  [4,16,-1,1,1,-1,0,1,1,0,1,1,1,1],
// 4 16 -1 1 -1 -1 0 -1 -1 0 1 -1 1 1
  [4,16,-1,1,-1,-1,0,-1,-1,0,1,-1,1,1],
// 4 16 1 1 -1 1 0 -1 -1 0 -1 -1 1 -1
  [4,16,1,1,-1,1,0,-1,-1,0,-1,-1,1,-1],
// 4 16 1 1 1 1 0 1 1 0 -1 1 1 -1
  [4,16,1,1,1,1,0,1,1,0,-1,1,1,-1],
];
module ldraw_lib__box5(step=0, col=false, unit=2/5, alt=false, line=0.2, solid=!$preview)
    makepoly(ldraw_lib__box5(solid), step=step, col=col, unit=unit, alt=alt, line=line, solid=solid);
ldraw_lib__box5(line=0.2);
// file: ../p/box4t.scad
use <../lib.scad>
$fa=1; $fs=0.2;
function ldraw_lib__box4t(realsolid=false) = [
// 0 Box with 4 Adjacent Faces and All Edges
// 0 Name: box4t.dat
// 0 Author: Tore Eriksson [Tore_Eriksson]
// 0 !LDRAW_ORG Primitive UPDATE 2003-02
// 0 !LICENSE Licensed under CC BY 2.0 and CC BY 4.0 : see CAreadme.txt
// 
// 0 BFC CERTIFY CCW
  [0,"BFC","CERTIFY"],
  [0,"BFC","CCW"],
// 
// 0 !HISTORY 1997-09-29 [PTadmin] Official Update 1997-15
// 0 !HISTORY 2002-08-31 [izanette] Modified with WINDZ for BFC compliance
// 0 !HISTORY 2003-08-01 [PTadmin] Official Update 2003-02
// 0 !HISTORY 2007-06-24 [PTadmin] Header formatted for Contributor Agreement
// 0 !HISTORY 2008-07-01 [PTadmin] Official Update 2008-01
// 
// 
// 2 24 1 1 1 -1 1 1
  [2,24,1,1,1,-1,1,1],
// 2 24 -1 1 1 -1 1 -1
  [2,24,-1,1,1,-1,1,-1],
// 2 24 -1 1 -1 1 1 -1
  [2,24,-1,1,-1,1,1,-1],
// 2 24 1 1 -1 1 1 1
  [2,24,1,1,-1,1,1,1],
// 2 24 1 0 1 -1 0 1
  [2,24,1,0,1,-1,0,1],
// 2 24 -1 0 1 -1 0 -1
  [2,24,-1,0,1,-1,0,-1],
// 2 24 -1 0 -1 1 0 -1
  [2,24,-1,0,-1,1,0,-1],
// 2 24 1 0 -1 1 0 1
  [2,24,1,0,-1,1,0,1],
// 2 24 1 0 1 1 1 1
  [2,24,1,0,1,1,1,1],
// 2 24 -1 0 1 -1 1 1
  [2,24,-1,0,1,-1,1,1],
// 2 24 1 0 -1 1 1 -1
  [2,24,1,0,-1,1,1,-1],
// 2 24 -1 0 -1 -1 1 -1
  [2,24,-1,0,-1,-1,1,-1],
// 4 16 1 1 1 1 1 -1 -1 1 -1 -1 1 1
  [4,16,1,1,1,1,1,-1,-1,1,-1,-1,1,1],
// 4 16 1 1 1 -1 1 1 -1 0 1 1 0 1
  [4,16,1,1,1,-1,1,1,-1,0,1,1,0,1],
// 4 16 -1 1 1 -1 1 -1 -1 0 -1 -1 0 1
  [4,16,-1,1,1,-1,1,-1,-1,0,-1,-1,0,1],
// 0 4 16 -1 1 -1 -1 0 -1 1 0 -1 1 1 -1
// 4 16 1 1 -1 1 1 1 1 0 1 1 0 -1
  [4,16,1,1,-1,1,1,1,1,0,1,1,0,-1],
// 0
];
module ldraw_lib__box4t(step=0, col=false, unit=2/5, alt=false, line=0.2, solid=!$preview)
    makepoly(ldraw_lib__box4t(solid), step=step, col=col, unit=unit, alt=alt, line=line, solid=solid);
ldraw_lib__box4t(line=0.2);
// file: 3004.scad
use <../lib.scad>
use <s/3004s01.scad>
$fa=1; $fs=0.2;
function ldraw_lib__3004(realsolid=false) = [
// 0 Brick  1 x  2
// 0 Name: 3004.dat
// 0 Author: James Jessiman
// 0 !LDRAW_ORG Part UPDATE 2022-05
// 0 !LICENSE Licensed under CC BY 2.0 and CC BY 4.0 : see CAreadme.txt
// 
// 0 BFC CERTIFY CCW
  [0,"BFC","CERTIFY"],
  [0,"BFC","CCW"],
// 
// 0 !HISTORY 2001-10-26 [PTadmin] Official Update 2001-01
// 0 !HISTORY 2002-05-07 {unknown} BFC Certification
// 0 !HISTORY 2002-06-11 [PTadmin] Official Update 2002-03
// 0 !HISTORY 2007-05-07 [PTadmin] Header formatted for Contributor Agreement
// 0 !HISTORY 2008-07-01 [PTadmin] Official Update 2008-01
// 0 !HISTORY 2022-08-04 [MagFors] Using subfile
// 0 !HISTORY 2022-09-15 [PTadmin] Official Update 2022-05
// 
// 
// 1 16 0 0 0 1 0 0 0 1 0 0 0 1 s\3004s01.dat
  [1,16,0,0,0,1,0,0,0,1,0,0,0,1, ldraw_lib__s__3004s01(realsolid)],
// 4 16 -20 24 -10 20 24 -10 20 0 -10 -20 0 -10
  [4,16,-20,24,-10,20,24,-10,20,0,-10,-20,0,-10],
];
module ldraw_lib__3004(step=0, col=false, unit=2/5, alt=false, line=0.2, solid=!$preview)
    makepoly(ldraw_lib__3004(solid), step=step, col=col, unit=unit, alt=alt, line=line, solid=solid);
ldraw_lib__3004(line=0.2);
// file: s/3024s01.scad
use <../../lib.scad>
use <../../p/box4t.scad>
use <../../p/box5.scad>
use <../../p/stud.scad>
$fa=1; $fs=0.2;
function ldraw_lib__s__3024s01(realsolid=false) = [
// 0 ~Plate  1 x  1 without Front Face
// 0 Name: s\3024s01.dat
// 0 Author: Tore Eriksson [Tore_Eriksson]
// 0 !LDRAW_ORG Subpart UPDATE 2012-03
// 0 !LICENSE Licensed under CC BY 2.0 and CC BY 4.0 : see CAreadme.txt
// 
// 0 BFC CERTIFY CCW
  [0,"BFC","CERTIFY"],
  [0,"BFC","CCW"],
// 
// 0 !HISTORY 2012-12-28 [PTadmin] Official Update 2012-03
// 
// 
// 0 BFC INVERTNEXT
  [0,"BFC","INVERTNEXT"],
// 1 16 0 8 0 0 0 6 0 -4 0 -6 0 0 box5.dat
  [1,16,0,8,0,0,0,6,0,-4,0,-6,0,0, ldraw_lib__box5(realsolid)],
// 4 16 10 8 -10 6 8 -6 6 8 6 10 8 10
  [4,16,10,8,-10,6,8,-6,6,8,6,10,8,10],
// 4 16 10 8 10 6 8 6 -6 8 6 -10 8 10
  [4,16,10,8,10,6,8,6,-6,8,6,-10,8,10],
// 4 16 -10 8 10 -6 8 6 -6 8 -6 -10 8 -10
  [4,16,-10,8,10,-6,8,6,-6,8,-6,-10,8,-10],
// 4 16 -10 8 -10 -6 8 -6 6 8 -6 10 8 -10
  [4,16,-10,8,-10,-6,8,-6,6,8,-6,10,8,-10],
// 1 16 0 8 0 10 0 0 0 -8 0 0 0 10 box4t.dat
  [1,16,0,8,0,10,0,0,0,-8,0,0,0,10, ldraw_lib__box4t(realsolid)],
// 1 16 0 0 0 0 0 1 0 1 0 -1 0 0 stud.dat
  [1,16,0,0,0,0,0,1,0,1,0,-1,0,0, ldraw_lib__stud(realsolid)],
];
module ldraw_lib__s__3024s01(step=0, col=false, unit=2/5, alt=false, line=0.2, solid=!$preview)
    makepoly(ldraw_lib__s__3024s01(solid), step=step, col=col, unit=unit, alt=alt, line=line, solid=solid);
ldraw_lib__s__3024s01(line=0.2);
// main file
use <../lib.scad>
use <s/3024s01.scad>
$fa=1; $fs=0.2;
function ldraw_lib__3024ptc4(realsolid=false) = [
// 0 Plate  1 x  1 with Minecraft Micro Mob Zombie Eyes Pattern
// 0 Name: 3024ptc4.dat
// 0 Author: Philippe Hurbain [Philo]
// 0 !LDRAW_ORG Part UPDATE 2014-01
// 0 !LICENSE Licensed under CC BY 2.0 and CC BY 4.0 : see CAreadme.txt
// 
// 0 BFC CERTIFY CCW
  [0,"BFC","CERTIFY"],
  [0,"BFC","CCW"],
// 
// 0 !HISTORY 2014-06-21 [PTadmin] Official Update 2014-01
// 
// 
// 1 16 0 0 0 1 0 0 0 1 0 0 0 1 s\3024s01.dat
  [1,16,0,0,0,1,0,0,0,1,0,0,0,1, ldraw_lib__s__3024s01(realsolid)],
// 4 16 -7.5 5.25 -10 -10 0 -10 -10 8 -10 -7.5 7.75 -10
  [4,16,-7.5,5.25,-10,-10,0,-10,-10,8,-10,-7.5,7.75,-10],
// 4 16 10 8 -10 10 0 -10 7.5 5.25 -10 7.5 7.75 -10
  [4,16,10,8,-10,10,0,-10,7.5,5.25,-10,7.5,7.75,-10],
// 3 16 -10 0 -10 -7.5 5.25 -10 -2.5 5.25 -10
  [3,16,-10,0,-10,-7.5,5.25,-10,-2.5,5.25,-10],
// 4 16 -10 0 -10 -2.5 5.25 -10 2.5 5.25 -10 10 0 -10
  [4,16,-10,0,-10,-2.5,5.25,-10,2.5,5.25,-10,10,0,-10],
// 3 16 10 0 -10 2.5 5.25 -10 7.5 5.25 -10
  [3,16,10,0,-10,2.5,5.25,-10,7.5,5.25,-10],
// 4 16 2.5 7.75 -10 2.5 5.25 -10 -2.5 5.25 -10 -2.5 7.75 -10
  [4,16,2.5,7.75,-10,2.5,5.25,-10,-2.5,5.25,-10,-2.5,7.75,-10],
// 4 16 10 8 -10 2.5 7.75 -10 -2.5 7.75 -10 -10 8 -10
  [4,16,10,8,-10,2.5,7.75,-10,-2.5,7.75,-10,-10,8,-10],
// 3 16 7.5 7.75 -10 2.5 7.75 -10 10 8 -10
  [3,16,7.5,7.75,-10,2.5,7.75,-10,10,8,-10],
// 3 16 -2.5 7.75 -10 -7.5 7.75 -10 -10 8 -10
  [3,16,-2.5,7.75,-10,-7.5,7.75,-10,-10,8,-10],
// 4 0 -2.5 5.25 -10 -7.5 5.25 -10 -7.5 7.75 -10 -2.5 7.75 -10
  [4,0,-2.5,5.25,-10,-7.5,5.25,-10,-7.5,7.75,-10,-2.5,7.75,-10],
// 4 0 7.5 5.25 -10 2.5 5.25 -10 2.5 7.75 -10 7.5 7.75 -10
  [4,0,7.5,5.25,-10,2.5,5.25,-10,2.5,7.75,-10,7.5,7.75,-10],
];
module ldraw_lib__3024ptc4(step=0, col=false, unit=2/5, alt=false, line=0.2, solid=!$preview)
    makepoly(ldraw_lib__3024ptc4(solid), step=step, col=col, unit=unit, alt=alt, line=line, solid=solid);
ldraw_lib__3024ptc4(line=0.2);
